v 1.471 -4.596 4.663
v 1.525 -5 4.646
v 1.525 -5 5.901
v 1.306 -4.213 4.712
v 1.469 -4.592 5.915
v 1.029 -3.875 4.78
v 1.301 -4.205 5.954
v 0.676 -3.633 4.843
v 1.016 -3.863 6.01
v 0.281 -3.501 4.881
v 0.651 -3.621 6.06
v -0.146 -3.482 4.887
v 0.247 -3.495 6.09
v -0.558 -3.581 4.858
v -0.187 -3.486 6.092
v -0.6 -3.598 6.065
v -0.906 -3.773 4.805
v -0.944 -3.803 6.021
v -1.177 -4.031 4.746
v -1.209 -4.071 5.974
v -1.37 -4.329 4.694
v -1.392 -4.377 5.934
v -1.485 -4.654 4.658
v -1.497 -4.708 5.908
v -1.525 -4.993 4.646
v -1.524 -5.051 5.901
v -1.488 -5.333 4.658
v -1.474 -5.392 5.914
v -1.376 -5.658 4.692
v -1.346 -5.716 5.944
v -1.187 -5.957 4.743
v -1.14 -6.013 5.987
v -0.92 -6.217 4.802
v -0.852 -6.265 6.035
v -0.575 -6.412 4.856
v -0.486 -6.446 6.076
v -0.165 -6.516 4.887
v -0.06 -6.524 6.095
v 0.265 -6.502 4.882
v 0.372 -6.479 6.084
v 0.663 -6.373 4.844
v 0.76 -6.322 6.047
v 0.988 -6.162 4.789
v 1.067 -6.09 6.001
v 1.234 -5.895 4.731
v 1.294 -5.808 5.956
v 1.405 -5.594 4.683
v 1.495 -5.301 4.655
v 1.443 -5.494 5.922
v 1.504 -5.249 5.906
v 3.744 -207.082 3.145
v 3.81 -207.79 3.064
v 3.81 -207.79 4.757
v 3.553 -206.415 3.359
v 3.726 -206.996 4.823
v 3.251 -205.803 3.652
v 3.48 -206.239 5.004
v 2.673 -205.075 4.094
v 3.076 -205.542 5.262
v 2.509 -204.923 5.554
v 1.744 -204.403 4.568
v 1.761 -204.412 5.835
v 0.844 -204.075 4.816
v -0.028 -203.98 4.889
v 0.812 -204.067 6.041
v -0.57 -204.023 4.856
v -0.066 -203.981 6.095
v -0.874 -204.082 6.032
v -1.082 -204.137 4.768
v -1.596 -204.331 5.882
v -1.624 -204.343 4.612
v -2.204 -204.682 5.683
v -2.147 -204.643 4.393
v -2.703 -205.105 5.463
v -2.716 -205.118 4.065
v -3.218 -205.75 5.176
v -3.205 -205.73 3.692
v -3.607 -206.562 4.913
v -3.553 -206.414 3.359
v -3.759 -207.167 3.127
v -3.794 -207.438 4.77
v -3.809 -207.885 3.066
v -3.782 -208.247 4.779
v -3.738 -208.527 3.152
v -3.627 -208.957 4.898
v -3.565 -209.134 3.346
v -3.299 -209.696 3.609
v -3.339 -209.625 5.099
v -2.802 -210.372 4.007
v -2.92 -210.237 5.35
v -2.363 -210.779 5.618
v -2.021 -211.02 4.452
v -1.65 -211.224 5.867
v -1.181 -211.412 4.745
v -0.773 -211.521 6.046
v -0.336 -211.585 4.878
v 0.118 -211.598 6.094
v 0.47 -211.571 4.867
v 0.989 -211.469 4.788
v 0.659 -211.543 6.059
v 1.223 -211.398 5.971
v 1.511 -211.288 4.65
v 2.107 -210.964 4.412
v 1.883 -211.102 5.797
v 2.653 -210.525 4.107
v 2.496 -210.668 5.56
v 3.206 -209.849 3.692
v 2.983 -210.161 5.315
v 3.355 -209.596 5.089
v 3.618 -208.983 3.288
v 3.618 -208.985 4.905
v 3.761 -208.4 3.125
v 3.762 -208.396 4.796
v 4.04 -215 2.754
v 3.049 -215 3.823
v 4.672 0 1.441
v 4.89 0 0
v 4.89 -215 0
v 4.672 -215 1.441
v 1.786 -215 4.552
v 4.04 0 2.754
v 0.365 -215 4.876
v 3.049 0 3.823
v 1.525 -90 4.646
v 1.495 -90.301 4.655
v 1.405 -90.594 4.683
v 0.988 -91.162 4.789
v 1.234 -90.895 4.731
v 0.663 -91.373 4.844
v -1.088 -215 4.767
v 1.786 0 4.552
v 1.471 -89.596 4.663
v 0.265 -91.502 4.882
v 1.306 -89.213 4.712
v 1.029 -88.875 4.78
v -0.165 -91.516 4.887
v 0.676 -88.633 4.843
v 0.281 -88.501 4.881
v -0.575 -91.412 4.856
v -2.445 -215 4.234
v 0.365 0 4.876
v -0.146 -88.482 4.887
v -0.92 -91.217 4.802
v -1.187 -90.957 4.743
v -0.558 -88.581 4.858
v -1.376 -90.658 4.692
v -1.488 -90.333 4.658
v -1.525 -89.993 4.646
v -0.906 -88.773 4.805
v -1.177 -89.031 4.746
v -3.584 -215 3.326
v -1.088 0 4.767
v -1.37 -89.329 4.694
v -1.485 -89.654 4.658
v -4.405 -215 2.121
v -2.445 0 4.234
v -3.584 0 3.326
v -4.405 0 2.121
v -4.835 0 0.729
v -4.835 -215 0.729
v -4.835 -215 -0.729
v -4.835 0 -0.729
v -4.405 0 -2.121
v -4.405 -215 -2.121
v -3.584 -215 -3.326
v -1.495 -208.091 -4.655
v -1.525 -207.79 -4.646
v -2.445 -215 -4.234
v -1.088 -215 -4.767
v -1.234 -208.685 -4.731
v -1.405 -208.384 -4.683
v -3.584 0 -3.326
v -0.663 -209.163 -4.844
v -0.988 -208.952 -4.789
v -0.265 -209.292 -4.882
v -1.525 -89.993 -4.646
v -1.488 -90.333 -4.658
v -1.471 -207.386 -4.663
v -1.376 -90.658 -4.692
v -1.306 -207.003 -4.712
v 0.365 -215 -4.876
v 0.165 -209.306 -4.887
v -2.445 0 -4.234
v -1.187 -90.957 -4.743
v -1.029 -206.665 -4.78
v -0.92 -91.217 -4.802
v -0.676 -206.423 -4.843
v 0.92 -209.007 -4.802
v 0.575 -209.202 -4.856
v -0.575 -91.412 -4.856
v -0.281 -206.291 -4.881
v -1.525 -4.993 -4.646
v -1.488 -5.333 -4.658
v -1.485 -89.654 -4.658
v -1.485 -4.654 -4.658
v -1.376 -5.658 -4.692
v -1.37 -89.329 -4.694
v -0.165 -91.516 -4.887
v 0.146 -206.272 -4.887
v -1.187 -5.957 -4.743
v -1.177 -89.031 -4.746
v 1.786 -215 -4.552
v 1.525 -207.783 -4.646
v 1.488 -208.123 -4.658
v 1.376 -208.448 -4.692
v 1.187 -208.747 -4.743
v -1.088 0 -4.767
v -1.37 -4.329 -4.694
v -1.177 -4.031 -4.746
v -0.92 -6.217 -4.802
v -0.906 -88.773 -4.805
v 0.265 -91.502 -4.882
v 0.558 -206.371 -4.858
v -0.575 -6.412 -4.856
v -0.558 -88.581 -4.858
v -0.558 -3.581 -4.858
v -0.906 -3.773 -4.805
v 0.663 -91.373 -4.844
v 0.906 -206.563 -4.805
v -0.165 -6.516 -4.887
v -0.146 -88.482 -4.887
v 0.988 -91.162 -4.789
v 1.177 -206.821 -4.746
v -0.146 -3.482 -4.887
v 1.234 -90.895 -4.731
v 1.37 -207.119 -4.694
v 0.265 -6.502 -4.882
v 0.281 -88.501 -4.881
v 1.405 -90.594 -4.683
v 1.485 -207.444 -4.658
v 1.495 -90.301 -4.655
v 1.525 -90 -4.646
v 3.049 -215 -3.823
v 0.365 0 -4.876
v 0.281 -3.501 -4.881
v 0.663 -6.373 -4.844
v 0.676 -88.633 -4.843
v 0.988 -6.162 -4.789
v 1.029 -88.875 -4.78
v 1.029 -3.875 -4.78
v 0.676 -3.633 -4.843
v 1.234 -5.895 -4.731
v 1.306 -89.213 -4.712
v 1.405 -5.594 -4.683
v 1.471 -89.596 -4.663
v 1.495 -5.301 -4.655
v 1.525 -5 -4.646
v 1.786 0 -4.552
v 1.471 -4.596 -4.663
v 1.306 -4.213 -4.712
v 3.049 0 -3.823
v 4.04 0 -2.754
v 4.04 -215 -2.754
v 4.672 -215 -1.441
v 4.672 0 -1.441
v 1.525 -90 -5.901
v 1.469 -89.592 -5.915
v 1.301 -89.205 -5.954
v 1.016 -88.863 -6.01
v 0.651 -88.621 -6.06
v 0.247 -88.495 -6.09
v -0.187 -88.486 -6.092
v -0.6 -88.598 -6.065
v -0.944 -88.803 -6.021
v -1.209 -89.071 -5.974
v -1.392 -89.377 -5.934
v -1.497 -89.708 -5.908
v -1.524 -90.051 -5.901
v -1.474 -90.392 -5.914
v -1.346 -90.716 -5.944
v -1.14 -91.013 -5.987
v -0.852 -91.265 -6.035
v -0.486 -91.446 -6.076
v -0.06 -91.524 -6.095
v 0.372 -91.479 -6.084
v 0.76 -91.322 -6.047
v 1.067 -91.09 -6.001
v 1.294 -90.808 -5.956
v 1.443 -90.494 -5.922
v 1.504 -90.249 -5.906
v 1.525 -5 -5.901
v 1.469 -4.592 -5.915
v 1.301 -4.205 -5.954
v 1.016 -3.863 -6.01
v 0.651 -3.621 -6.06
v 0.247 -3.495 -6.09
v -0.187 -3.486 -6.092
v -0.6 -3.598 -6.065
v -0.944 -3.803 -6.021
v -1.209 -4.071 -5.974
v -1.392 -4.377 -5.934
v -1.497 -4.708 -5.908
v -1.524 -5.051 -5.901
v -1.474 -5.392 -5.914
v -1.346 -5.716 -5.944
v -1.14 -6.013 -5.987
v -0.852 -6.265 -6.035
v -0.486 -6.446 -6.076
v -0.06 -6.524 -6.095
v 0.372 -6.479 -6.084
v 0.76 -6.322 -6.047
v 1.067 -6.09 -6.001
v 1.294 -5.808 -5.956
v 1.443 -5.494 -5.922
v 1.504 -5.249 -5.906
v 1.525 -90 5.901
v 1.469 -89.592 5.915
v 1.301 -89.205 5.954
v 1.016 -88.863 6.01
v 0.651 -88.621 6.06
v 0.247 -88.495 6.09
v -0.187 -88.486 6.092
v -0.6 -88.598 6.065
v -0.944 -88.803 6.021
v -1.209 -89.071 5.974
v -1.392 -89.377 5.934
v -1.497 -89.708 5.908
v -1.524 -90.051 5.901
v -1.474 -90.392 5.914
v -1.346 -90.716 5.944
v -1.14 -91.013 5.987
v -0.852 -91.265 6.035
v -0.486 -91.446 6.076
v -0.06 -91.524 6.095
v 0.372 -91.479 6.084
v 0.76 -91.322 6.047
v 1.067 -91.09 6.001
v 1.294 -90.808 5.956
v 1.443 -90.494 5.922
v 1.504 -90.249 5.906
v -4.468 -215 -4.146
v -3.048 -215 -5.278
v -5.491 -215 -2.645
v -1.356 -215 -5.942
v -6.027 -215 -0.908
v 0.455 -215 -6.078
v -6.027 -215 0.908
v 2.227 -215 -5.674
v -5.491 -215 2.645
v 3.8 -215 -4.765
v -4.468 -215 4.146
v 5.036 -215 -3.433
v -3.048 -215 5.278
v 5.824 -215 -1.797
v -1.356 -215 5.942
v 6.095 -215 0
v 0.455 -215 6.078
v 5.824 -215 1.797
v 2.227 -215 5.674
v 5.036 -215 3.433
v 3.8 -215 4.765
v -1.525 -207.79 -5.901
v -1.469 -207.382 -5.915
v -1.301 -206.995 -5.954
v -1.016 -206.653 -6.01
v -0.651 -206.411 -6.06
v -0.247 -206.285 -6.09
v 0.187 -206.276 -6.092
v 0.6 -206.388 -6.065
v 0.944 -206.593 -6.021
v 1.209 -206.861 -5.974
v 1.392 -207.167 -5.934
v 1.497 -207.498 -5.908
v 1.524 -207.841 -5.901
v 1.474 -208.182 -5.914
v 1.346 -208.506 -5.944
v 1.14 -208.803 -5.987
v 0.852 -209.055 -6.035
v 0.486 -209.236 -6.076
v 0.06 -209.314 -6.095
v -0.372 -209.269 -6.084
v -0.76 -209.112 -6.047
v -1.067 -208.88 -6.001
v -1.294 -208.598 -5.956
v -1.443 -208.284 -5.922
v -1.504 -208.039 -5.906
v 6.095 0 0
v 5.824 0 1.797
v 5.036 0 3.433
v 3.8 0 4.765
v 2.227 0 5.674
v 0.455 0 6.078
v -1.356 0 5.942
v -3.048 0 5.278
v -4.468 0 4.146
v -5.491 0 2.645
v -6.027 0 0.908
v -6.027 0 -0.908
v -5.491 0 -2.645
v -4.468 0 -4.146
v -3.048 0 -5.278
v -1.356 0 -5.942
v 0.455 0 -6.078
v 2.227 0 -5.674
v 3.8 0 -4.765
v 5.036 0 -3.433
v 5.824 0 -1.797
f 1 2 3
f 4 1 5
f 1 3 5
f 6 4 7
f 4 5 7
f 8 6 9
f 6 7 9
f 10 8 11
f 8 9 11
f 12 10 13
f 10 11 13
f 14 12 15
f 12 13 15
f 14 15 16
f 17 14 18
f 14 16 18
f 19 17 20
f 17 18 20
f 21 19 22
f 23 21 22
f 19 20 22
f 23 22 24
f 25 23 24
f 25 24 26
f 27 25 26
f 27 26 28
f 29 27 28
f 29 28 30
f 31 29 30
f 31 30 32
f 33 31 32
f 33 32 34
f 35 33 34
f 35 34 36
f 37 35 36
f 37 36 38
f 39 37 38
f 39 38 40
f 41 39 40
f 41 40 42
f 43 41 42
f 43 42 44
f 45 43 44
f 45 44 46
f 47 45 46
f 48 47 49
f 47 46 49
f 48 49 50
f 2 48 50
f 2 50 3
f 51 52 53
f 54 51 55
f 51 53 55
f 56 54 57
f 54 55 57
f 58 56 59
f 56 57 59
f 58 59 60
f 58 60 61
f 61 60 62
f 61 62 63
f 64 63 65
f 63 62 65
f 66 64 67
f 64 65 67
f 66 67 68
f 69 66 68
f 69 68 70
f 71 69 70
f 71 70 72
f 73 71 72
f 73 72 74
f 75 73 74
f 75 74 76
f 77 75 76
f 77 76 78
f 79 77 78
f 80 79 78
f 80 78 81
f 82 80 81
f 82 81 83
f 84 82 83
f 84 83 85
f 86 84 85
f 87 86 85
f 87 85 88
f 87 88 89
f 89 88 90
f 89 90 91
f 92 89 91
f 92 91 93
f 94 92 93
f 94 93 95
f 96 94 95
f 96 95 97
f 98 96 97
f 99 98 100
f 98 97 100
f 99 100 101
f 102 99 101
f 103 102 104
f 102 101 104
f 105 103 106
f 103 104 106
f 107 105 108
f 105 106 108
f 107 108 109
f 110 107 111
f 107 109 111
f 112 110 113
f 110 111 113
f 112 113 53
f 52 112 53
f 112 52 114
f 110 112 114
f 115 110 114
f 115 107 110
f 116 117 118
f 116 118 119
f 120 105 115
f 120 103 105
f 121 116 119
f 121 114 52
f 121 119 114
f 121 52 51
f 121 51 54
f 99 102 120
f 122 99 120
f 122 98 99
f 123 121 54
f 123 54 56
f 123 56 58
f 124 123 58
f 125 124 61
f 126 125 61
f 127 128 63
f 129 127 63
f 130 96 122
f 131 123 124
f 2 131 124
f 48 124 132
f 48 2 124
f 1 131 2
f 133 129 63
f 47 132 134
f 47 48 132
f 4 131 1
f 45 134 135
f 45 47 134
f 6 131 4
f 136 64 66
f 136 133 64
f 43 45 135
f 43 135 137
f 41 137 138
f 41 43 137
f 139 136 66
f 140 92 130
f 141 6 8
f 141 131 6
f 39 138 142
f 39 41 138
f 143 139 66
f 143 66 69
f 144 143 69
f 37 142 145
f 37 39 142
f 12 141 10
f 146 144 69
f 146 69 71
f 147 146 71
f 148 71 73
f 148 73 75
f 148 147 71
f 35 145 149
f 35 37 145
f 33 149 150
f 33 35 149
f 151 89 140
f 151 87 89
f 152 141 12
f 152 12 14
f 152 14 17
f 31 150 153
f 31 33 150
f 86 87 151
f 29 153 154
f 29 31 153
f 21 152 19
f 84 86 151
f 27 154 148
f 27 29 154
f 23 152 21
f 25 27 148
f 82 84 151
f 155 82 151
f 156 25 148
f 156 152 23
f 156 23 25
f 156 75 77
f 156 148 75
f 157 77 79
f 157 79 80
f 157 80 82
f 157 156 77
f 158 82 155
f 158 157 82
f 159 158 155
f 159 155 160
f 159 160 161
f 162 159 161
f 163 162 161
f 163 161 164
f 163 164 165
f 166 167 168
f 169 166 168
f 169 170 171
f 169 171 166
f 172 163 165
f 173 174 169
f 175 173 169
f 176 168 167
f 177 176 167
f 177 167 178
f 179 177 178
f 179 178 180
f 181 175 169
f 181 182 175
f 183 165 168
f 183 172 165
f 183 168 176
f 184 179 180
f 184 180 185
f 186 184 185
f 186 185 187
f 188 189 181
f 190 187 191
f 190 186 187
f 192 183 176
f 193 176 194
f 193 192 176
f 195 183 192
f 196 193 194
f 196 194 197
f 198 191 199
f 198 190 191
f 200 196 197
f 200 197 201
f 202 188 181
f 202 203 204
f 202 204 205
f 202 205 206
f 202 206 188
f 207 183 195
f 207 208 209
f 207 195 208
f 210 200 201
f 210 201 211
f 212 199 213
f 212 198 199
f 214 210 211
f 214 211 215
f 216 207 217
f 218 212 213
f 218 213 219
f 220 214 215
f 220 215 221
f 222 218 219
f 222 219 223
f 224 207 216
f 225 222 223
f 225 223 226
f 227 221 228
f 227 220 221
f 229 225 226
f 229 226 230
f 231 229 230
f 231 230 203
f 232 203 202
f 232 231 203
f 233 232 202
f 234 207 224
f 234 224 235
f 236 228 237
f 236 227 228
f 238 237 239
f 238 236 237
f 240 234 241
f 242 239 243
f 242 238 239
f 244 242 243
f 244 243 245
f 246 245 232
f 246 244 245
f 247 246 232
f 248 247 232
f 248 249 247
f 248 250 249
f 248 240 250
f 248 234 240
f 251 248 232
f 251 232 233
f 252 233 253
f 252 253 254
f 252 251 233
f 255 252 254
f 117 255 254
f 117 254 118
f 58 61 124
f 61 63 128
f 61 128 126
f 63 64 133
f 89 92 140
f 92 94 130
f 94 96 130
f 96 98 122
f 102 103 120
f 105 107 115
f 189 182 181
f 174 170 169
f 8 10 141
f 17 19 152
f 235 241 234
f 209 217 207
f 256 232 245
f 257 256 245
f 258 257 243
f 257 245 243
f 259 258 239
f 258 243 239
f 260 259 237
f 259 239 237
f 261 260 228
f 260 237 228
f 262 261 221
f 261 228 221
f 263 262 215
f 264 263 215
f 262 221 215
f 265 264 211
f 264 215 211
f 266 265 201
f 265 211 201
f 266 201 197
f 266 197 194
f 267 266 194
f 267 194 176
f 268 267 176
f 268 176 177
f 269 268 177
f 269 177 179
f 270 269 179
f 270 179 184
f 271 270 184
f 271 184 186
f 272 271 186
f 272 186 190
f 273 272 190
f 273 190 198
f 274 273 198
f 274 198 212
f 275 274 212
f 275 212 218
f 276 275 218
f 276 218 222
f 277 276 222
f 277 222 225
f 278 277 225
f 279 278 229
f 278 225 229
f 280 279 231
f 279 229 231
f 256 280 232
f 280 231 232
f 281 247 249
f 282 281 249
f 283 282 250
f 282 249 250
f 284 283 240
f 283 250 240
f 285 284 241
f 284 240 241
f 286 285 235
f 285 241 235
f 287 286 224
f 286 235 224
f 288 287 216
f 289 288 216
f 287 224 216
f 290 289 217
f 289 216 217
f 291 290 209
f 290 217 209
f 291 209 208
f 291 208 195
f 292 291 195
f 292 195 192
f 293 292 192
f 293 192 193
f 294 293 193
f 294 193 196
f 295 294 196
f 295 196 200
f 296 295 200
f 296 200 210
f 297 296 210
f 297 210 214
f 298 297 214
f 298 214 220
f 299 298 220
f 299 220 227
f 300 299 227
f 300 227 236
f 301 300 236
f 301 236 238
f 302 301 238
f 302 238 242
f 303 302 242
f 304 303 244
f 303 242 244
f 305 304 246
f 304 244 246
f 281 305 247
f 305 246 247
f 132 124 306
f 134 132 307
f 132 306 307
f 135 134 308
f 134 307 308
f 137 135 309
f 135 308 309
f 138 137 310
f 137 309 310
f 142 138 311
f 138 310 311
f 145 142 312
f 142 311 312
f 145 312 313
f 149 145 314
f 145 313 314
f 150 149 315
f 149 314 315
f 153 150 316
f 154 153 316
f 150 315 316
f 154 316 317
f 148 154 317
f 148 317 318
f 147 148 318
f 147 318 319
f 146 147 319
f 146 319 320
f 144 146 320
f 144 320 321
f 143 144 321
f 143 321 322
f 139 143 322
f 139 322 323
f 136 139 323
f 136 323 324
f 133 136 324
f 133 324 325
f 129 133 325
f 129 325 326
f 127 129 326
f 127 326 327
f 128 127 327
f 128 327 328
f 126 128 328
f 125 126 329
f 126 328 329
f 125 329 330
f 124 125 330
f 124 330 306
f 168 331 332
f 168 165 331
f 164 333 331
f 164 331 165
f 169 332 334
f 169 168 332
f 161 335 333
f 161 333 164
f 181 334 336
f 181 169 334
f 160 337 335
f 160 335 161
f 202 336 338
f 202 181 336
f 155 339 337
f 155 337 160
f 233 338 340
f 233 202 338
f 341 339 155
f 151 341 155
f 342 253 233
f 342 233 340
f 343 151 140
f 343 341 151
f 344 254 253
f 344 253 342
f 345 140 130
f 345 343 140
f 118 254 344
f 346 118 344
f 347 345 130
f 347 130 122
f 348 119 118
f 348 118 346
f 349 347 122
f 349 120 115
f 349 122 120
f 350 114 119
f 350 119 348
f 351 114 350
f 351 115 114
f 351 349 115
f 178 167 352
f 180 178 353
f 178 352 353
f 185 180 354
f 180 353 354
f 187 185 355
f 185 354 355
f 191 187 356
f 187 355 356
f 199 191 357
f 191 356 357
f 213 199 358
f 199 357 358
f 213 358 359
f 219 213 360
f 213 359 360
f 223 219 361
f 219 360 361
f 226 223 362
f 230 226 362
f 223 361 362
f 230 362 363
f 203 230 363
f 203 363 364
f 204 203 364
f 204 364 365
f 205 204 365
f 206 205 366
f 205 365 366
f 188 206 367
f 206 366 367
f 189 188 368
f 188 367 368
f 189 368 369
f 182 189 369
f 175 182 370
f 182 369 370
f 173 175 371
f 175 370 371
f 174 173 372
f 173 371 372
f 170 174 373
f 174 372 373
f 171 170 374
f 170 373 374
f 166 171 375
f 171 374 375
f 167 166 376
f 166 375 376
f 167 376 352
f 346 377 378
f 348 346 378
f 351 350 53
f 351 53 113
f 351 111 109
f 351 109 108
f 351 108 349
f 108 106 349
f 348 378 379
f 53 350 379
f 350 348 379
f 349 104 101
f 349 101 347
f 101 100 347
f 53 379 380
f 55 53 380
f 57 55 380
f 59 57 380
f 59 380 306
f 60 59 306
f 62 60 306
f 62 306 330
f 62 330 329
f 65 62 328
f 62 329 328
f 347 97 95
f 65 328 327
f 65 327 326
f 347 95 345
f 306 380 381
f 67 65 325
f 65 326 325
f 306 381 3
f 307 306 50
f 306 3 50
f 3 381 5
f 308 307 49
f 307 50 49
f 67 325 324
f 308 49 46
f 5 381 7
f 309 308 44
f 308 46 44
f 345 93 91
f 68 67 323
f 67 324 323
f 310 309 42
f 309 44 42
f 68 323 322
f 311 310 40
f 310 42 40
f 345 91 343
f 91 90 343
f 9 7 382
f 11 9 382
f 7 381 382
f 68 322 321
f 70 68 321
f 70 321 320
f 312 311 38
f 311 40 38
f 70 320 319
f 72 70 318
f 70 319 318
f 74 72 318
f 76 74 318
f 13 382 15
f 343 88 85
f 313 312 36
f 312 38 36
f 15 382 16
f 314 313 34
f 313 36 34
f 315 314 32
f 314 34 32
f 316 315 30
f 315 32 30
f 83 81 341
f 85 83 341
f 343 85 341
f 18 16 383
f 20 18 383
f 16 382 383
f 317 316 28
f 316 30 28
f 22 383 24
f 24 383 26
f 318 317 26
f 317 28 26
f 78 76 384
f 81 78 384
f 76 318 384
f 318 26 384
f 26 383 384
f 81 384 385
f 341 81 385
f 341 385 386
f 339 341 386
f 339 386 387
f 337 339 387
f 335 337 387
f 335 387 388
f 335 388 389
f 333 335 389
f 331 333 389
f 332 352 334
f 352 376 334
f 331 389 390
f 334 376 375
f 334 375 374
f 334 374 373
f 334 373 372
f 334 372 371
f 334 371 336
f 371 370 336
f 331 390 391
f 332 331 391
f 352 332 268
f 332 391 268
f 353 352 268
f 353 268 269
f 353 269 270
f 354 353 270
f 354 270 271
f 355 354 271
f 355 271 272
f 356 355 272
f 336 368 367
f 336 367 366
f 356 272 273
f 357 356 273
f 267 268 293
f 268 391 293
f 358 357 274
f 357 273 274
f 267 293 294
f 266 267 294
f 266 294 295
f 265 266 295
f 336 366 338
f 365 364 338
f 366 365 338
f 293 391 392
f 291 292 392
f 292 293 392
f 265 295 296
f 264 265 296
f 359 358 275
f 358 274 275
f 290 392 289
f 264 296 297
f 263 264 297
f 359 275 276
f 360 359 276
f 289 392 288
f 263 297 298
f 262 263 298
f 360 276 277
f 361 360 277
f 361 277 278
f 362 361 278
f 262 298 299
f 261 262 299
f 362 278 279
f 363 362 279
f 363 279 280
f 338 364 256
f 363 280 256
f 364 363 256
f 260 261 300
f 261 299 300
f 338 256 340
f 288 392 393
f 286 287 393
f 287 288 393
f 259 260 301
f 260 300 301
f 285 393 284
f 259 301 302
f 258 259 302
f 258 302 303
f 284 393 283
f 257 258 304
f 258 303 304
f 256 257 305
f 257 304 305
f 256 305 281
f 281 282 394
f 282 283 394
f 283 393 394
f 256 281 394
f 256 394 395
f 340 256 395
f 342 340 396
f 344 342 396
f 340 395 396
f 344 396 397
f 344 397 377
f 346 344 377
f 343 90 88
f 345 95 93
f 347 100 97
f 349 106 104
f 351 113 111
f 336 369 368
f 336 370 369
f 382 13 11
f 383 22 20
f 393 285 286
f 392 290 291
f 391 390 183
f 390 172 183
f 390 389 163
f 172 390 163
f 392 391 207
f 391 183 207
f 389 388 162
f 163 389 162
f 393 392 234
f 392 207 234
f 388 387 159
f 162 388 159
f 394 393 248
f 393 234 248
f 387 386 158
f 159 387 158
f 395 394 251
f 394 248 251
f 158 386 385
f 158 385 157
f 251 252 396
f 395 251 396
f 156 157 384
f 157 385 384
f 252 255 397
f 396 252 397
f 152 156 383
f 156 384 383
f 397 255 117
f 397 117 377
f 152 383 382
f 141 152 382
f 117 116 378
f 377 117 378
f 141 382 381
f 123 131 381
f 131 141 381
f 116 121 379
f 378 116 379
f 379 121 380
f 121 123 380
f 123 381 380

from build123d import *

# Parameters (mm, degrees)
SKETCH_R         = 6.095
SKETCH_R_2       = 4.8895
PAD_DEPTH        = 215
HOLE_D           = 3.05
HOLE_DEPTH       = 25
HOLE_CBORE_D     = 7.62
HOLE_CBORE_DEPTH = 5
SKETCH002_R      = 1.525
HOLE001_DEPTH    = 25


with BuildPart() as part:
    # Sketch → Pad (new body)
    with BuildSketch(Plane.XZ):
        Circle(SKETCH_R)
        Circle(SKETCH_R_2, mode=Mode.SUBTRACT)
    extrude(amount=PAD_DEPTH)

    # Hole
    with Locations(Plane.XY.offset(7)):
        with Locations((0, -207.79)):
            CounterBoreHole(HOLE_D / 2, HOLE_CBORE_D / 2, HOLE_CBORE_DEPTH, depth=HOLE_DEPTH)

    # Sketch002 → Hole001 (cut)
    with BuildSketch(Plane.XY.offset(7)):
        with Locations((0, -5)):
            Circle(SKETCH002_R)
        with Locations((0, -90)):
            Circle(SKETCH002_R)
    extrude(amount=-HOLE001_DEPTH, mode=Mode.SUBTRACT)


solid = part.part
